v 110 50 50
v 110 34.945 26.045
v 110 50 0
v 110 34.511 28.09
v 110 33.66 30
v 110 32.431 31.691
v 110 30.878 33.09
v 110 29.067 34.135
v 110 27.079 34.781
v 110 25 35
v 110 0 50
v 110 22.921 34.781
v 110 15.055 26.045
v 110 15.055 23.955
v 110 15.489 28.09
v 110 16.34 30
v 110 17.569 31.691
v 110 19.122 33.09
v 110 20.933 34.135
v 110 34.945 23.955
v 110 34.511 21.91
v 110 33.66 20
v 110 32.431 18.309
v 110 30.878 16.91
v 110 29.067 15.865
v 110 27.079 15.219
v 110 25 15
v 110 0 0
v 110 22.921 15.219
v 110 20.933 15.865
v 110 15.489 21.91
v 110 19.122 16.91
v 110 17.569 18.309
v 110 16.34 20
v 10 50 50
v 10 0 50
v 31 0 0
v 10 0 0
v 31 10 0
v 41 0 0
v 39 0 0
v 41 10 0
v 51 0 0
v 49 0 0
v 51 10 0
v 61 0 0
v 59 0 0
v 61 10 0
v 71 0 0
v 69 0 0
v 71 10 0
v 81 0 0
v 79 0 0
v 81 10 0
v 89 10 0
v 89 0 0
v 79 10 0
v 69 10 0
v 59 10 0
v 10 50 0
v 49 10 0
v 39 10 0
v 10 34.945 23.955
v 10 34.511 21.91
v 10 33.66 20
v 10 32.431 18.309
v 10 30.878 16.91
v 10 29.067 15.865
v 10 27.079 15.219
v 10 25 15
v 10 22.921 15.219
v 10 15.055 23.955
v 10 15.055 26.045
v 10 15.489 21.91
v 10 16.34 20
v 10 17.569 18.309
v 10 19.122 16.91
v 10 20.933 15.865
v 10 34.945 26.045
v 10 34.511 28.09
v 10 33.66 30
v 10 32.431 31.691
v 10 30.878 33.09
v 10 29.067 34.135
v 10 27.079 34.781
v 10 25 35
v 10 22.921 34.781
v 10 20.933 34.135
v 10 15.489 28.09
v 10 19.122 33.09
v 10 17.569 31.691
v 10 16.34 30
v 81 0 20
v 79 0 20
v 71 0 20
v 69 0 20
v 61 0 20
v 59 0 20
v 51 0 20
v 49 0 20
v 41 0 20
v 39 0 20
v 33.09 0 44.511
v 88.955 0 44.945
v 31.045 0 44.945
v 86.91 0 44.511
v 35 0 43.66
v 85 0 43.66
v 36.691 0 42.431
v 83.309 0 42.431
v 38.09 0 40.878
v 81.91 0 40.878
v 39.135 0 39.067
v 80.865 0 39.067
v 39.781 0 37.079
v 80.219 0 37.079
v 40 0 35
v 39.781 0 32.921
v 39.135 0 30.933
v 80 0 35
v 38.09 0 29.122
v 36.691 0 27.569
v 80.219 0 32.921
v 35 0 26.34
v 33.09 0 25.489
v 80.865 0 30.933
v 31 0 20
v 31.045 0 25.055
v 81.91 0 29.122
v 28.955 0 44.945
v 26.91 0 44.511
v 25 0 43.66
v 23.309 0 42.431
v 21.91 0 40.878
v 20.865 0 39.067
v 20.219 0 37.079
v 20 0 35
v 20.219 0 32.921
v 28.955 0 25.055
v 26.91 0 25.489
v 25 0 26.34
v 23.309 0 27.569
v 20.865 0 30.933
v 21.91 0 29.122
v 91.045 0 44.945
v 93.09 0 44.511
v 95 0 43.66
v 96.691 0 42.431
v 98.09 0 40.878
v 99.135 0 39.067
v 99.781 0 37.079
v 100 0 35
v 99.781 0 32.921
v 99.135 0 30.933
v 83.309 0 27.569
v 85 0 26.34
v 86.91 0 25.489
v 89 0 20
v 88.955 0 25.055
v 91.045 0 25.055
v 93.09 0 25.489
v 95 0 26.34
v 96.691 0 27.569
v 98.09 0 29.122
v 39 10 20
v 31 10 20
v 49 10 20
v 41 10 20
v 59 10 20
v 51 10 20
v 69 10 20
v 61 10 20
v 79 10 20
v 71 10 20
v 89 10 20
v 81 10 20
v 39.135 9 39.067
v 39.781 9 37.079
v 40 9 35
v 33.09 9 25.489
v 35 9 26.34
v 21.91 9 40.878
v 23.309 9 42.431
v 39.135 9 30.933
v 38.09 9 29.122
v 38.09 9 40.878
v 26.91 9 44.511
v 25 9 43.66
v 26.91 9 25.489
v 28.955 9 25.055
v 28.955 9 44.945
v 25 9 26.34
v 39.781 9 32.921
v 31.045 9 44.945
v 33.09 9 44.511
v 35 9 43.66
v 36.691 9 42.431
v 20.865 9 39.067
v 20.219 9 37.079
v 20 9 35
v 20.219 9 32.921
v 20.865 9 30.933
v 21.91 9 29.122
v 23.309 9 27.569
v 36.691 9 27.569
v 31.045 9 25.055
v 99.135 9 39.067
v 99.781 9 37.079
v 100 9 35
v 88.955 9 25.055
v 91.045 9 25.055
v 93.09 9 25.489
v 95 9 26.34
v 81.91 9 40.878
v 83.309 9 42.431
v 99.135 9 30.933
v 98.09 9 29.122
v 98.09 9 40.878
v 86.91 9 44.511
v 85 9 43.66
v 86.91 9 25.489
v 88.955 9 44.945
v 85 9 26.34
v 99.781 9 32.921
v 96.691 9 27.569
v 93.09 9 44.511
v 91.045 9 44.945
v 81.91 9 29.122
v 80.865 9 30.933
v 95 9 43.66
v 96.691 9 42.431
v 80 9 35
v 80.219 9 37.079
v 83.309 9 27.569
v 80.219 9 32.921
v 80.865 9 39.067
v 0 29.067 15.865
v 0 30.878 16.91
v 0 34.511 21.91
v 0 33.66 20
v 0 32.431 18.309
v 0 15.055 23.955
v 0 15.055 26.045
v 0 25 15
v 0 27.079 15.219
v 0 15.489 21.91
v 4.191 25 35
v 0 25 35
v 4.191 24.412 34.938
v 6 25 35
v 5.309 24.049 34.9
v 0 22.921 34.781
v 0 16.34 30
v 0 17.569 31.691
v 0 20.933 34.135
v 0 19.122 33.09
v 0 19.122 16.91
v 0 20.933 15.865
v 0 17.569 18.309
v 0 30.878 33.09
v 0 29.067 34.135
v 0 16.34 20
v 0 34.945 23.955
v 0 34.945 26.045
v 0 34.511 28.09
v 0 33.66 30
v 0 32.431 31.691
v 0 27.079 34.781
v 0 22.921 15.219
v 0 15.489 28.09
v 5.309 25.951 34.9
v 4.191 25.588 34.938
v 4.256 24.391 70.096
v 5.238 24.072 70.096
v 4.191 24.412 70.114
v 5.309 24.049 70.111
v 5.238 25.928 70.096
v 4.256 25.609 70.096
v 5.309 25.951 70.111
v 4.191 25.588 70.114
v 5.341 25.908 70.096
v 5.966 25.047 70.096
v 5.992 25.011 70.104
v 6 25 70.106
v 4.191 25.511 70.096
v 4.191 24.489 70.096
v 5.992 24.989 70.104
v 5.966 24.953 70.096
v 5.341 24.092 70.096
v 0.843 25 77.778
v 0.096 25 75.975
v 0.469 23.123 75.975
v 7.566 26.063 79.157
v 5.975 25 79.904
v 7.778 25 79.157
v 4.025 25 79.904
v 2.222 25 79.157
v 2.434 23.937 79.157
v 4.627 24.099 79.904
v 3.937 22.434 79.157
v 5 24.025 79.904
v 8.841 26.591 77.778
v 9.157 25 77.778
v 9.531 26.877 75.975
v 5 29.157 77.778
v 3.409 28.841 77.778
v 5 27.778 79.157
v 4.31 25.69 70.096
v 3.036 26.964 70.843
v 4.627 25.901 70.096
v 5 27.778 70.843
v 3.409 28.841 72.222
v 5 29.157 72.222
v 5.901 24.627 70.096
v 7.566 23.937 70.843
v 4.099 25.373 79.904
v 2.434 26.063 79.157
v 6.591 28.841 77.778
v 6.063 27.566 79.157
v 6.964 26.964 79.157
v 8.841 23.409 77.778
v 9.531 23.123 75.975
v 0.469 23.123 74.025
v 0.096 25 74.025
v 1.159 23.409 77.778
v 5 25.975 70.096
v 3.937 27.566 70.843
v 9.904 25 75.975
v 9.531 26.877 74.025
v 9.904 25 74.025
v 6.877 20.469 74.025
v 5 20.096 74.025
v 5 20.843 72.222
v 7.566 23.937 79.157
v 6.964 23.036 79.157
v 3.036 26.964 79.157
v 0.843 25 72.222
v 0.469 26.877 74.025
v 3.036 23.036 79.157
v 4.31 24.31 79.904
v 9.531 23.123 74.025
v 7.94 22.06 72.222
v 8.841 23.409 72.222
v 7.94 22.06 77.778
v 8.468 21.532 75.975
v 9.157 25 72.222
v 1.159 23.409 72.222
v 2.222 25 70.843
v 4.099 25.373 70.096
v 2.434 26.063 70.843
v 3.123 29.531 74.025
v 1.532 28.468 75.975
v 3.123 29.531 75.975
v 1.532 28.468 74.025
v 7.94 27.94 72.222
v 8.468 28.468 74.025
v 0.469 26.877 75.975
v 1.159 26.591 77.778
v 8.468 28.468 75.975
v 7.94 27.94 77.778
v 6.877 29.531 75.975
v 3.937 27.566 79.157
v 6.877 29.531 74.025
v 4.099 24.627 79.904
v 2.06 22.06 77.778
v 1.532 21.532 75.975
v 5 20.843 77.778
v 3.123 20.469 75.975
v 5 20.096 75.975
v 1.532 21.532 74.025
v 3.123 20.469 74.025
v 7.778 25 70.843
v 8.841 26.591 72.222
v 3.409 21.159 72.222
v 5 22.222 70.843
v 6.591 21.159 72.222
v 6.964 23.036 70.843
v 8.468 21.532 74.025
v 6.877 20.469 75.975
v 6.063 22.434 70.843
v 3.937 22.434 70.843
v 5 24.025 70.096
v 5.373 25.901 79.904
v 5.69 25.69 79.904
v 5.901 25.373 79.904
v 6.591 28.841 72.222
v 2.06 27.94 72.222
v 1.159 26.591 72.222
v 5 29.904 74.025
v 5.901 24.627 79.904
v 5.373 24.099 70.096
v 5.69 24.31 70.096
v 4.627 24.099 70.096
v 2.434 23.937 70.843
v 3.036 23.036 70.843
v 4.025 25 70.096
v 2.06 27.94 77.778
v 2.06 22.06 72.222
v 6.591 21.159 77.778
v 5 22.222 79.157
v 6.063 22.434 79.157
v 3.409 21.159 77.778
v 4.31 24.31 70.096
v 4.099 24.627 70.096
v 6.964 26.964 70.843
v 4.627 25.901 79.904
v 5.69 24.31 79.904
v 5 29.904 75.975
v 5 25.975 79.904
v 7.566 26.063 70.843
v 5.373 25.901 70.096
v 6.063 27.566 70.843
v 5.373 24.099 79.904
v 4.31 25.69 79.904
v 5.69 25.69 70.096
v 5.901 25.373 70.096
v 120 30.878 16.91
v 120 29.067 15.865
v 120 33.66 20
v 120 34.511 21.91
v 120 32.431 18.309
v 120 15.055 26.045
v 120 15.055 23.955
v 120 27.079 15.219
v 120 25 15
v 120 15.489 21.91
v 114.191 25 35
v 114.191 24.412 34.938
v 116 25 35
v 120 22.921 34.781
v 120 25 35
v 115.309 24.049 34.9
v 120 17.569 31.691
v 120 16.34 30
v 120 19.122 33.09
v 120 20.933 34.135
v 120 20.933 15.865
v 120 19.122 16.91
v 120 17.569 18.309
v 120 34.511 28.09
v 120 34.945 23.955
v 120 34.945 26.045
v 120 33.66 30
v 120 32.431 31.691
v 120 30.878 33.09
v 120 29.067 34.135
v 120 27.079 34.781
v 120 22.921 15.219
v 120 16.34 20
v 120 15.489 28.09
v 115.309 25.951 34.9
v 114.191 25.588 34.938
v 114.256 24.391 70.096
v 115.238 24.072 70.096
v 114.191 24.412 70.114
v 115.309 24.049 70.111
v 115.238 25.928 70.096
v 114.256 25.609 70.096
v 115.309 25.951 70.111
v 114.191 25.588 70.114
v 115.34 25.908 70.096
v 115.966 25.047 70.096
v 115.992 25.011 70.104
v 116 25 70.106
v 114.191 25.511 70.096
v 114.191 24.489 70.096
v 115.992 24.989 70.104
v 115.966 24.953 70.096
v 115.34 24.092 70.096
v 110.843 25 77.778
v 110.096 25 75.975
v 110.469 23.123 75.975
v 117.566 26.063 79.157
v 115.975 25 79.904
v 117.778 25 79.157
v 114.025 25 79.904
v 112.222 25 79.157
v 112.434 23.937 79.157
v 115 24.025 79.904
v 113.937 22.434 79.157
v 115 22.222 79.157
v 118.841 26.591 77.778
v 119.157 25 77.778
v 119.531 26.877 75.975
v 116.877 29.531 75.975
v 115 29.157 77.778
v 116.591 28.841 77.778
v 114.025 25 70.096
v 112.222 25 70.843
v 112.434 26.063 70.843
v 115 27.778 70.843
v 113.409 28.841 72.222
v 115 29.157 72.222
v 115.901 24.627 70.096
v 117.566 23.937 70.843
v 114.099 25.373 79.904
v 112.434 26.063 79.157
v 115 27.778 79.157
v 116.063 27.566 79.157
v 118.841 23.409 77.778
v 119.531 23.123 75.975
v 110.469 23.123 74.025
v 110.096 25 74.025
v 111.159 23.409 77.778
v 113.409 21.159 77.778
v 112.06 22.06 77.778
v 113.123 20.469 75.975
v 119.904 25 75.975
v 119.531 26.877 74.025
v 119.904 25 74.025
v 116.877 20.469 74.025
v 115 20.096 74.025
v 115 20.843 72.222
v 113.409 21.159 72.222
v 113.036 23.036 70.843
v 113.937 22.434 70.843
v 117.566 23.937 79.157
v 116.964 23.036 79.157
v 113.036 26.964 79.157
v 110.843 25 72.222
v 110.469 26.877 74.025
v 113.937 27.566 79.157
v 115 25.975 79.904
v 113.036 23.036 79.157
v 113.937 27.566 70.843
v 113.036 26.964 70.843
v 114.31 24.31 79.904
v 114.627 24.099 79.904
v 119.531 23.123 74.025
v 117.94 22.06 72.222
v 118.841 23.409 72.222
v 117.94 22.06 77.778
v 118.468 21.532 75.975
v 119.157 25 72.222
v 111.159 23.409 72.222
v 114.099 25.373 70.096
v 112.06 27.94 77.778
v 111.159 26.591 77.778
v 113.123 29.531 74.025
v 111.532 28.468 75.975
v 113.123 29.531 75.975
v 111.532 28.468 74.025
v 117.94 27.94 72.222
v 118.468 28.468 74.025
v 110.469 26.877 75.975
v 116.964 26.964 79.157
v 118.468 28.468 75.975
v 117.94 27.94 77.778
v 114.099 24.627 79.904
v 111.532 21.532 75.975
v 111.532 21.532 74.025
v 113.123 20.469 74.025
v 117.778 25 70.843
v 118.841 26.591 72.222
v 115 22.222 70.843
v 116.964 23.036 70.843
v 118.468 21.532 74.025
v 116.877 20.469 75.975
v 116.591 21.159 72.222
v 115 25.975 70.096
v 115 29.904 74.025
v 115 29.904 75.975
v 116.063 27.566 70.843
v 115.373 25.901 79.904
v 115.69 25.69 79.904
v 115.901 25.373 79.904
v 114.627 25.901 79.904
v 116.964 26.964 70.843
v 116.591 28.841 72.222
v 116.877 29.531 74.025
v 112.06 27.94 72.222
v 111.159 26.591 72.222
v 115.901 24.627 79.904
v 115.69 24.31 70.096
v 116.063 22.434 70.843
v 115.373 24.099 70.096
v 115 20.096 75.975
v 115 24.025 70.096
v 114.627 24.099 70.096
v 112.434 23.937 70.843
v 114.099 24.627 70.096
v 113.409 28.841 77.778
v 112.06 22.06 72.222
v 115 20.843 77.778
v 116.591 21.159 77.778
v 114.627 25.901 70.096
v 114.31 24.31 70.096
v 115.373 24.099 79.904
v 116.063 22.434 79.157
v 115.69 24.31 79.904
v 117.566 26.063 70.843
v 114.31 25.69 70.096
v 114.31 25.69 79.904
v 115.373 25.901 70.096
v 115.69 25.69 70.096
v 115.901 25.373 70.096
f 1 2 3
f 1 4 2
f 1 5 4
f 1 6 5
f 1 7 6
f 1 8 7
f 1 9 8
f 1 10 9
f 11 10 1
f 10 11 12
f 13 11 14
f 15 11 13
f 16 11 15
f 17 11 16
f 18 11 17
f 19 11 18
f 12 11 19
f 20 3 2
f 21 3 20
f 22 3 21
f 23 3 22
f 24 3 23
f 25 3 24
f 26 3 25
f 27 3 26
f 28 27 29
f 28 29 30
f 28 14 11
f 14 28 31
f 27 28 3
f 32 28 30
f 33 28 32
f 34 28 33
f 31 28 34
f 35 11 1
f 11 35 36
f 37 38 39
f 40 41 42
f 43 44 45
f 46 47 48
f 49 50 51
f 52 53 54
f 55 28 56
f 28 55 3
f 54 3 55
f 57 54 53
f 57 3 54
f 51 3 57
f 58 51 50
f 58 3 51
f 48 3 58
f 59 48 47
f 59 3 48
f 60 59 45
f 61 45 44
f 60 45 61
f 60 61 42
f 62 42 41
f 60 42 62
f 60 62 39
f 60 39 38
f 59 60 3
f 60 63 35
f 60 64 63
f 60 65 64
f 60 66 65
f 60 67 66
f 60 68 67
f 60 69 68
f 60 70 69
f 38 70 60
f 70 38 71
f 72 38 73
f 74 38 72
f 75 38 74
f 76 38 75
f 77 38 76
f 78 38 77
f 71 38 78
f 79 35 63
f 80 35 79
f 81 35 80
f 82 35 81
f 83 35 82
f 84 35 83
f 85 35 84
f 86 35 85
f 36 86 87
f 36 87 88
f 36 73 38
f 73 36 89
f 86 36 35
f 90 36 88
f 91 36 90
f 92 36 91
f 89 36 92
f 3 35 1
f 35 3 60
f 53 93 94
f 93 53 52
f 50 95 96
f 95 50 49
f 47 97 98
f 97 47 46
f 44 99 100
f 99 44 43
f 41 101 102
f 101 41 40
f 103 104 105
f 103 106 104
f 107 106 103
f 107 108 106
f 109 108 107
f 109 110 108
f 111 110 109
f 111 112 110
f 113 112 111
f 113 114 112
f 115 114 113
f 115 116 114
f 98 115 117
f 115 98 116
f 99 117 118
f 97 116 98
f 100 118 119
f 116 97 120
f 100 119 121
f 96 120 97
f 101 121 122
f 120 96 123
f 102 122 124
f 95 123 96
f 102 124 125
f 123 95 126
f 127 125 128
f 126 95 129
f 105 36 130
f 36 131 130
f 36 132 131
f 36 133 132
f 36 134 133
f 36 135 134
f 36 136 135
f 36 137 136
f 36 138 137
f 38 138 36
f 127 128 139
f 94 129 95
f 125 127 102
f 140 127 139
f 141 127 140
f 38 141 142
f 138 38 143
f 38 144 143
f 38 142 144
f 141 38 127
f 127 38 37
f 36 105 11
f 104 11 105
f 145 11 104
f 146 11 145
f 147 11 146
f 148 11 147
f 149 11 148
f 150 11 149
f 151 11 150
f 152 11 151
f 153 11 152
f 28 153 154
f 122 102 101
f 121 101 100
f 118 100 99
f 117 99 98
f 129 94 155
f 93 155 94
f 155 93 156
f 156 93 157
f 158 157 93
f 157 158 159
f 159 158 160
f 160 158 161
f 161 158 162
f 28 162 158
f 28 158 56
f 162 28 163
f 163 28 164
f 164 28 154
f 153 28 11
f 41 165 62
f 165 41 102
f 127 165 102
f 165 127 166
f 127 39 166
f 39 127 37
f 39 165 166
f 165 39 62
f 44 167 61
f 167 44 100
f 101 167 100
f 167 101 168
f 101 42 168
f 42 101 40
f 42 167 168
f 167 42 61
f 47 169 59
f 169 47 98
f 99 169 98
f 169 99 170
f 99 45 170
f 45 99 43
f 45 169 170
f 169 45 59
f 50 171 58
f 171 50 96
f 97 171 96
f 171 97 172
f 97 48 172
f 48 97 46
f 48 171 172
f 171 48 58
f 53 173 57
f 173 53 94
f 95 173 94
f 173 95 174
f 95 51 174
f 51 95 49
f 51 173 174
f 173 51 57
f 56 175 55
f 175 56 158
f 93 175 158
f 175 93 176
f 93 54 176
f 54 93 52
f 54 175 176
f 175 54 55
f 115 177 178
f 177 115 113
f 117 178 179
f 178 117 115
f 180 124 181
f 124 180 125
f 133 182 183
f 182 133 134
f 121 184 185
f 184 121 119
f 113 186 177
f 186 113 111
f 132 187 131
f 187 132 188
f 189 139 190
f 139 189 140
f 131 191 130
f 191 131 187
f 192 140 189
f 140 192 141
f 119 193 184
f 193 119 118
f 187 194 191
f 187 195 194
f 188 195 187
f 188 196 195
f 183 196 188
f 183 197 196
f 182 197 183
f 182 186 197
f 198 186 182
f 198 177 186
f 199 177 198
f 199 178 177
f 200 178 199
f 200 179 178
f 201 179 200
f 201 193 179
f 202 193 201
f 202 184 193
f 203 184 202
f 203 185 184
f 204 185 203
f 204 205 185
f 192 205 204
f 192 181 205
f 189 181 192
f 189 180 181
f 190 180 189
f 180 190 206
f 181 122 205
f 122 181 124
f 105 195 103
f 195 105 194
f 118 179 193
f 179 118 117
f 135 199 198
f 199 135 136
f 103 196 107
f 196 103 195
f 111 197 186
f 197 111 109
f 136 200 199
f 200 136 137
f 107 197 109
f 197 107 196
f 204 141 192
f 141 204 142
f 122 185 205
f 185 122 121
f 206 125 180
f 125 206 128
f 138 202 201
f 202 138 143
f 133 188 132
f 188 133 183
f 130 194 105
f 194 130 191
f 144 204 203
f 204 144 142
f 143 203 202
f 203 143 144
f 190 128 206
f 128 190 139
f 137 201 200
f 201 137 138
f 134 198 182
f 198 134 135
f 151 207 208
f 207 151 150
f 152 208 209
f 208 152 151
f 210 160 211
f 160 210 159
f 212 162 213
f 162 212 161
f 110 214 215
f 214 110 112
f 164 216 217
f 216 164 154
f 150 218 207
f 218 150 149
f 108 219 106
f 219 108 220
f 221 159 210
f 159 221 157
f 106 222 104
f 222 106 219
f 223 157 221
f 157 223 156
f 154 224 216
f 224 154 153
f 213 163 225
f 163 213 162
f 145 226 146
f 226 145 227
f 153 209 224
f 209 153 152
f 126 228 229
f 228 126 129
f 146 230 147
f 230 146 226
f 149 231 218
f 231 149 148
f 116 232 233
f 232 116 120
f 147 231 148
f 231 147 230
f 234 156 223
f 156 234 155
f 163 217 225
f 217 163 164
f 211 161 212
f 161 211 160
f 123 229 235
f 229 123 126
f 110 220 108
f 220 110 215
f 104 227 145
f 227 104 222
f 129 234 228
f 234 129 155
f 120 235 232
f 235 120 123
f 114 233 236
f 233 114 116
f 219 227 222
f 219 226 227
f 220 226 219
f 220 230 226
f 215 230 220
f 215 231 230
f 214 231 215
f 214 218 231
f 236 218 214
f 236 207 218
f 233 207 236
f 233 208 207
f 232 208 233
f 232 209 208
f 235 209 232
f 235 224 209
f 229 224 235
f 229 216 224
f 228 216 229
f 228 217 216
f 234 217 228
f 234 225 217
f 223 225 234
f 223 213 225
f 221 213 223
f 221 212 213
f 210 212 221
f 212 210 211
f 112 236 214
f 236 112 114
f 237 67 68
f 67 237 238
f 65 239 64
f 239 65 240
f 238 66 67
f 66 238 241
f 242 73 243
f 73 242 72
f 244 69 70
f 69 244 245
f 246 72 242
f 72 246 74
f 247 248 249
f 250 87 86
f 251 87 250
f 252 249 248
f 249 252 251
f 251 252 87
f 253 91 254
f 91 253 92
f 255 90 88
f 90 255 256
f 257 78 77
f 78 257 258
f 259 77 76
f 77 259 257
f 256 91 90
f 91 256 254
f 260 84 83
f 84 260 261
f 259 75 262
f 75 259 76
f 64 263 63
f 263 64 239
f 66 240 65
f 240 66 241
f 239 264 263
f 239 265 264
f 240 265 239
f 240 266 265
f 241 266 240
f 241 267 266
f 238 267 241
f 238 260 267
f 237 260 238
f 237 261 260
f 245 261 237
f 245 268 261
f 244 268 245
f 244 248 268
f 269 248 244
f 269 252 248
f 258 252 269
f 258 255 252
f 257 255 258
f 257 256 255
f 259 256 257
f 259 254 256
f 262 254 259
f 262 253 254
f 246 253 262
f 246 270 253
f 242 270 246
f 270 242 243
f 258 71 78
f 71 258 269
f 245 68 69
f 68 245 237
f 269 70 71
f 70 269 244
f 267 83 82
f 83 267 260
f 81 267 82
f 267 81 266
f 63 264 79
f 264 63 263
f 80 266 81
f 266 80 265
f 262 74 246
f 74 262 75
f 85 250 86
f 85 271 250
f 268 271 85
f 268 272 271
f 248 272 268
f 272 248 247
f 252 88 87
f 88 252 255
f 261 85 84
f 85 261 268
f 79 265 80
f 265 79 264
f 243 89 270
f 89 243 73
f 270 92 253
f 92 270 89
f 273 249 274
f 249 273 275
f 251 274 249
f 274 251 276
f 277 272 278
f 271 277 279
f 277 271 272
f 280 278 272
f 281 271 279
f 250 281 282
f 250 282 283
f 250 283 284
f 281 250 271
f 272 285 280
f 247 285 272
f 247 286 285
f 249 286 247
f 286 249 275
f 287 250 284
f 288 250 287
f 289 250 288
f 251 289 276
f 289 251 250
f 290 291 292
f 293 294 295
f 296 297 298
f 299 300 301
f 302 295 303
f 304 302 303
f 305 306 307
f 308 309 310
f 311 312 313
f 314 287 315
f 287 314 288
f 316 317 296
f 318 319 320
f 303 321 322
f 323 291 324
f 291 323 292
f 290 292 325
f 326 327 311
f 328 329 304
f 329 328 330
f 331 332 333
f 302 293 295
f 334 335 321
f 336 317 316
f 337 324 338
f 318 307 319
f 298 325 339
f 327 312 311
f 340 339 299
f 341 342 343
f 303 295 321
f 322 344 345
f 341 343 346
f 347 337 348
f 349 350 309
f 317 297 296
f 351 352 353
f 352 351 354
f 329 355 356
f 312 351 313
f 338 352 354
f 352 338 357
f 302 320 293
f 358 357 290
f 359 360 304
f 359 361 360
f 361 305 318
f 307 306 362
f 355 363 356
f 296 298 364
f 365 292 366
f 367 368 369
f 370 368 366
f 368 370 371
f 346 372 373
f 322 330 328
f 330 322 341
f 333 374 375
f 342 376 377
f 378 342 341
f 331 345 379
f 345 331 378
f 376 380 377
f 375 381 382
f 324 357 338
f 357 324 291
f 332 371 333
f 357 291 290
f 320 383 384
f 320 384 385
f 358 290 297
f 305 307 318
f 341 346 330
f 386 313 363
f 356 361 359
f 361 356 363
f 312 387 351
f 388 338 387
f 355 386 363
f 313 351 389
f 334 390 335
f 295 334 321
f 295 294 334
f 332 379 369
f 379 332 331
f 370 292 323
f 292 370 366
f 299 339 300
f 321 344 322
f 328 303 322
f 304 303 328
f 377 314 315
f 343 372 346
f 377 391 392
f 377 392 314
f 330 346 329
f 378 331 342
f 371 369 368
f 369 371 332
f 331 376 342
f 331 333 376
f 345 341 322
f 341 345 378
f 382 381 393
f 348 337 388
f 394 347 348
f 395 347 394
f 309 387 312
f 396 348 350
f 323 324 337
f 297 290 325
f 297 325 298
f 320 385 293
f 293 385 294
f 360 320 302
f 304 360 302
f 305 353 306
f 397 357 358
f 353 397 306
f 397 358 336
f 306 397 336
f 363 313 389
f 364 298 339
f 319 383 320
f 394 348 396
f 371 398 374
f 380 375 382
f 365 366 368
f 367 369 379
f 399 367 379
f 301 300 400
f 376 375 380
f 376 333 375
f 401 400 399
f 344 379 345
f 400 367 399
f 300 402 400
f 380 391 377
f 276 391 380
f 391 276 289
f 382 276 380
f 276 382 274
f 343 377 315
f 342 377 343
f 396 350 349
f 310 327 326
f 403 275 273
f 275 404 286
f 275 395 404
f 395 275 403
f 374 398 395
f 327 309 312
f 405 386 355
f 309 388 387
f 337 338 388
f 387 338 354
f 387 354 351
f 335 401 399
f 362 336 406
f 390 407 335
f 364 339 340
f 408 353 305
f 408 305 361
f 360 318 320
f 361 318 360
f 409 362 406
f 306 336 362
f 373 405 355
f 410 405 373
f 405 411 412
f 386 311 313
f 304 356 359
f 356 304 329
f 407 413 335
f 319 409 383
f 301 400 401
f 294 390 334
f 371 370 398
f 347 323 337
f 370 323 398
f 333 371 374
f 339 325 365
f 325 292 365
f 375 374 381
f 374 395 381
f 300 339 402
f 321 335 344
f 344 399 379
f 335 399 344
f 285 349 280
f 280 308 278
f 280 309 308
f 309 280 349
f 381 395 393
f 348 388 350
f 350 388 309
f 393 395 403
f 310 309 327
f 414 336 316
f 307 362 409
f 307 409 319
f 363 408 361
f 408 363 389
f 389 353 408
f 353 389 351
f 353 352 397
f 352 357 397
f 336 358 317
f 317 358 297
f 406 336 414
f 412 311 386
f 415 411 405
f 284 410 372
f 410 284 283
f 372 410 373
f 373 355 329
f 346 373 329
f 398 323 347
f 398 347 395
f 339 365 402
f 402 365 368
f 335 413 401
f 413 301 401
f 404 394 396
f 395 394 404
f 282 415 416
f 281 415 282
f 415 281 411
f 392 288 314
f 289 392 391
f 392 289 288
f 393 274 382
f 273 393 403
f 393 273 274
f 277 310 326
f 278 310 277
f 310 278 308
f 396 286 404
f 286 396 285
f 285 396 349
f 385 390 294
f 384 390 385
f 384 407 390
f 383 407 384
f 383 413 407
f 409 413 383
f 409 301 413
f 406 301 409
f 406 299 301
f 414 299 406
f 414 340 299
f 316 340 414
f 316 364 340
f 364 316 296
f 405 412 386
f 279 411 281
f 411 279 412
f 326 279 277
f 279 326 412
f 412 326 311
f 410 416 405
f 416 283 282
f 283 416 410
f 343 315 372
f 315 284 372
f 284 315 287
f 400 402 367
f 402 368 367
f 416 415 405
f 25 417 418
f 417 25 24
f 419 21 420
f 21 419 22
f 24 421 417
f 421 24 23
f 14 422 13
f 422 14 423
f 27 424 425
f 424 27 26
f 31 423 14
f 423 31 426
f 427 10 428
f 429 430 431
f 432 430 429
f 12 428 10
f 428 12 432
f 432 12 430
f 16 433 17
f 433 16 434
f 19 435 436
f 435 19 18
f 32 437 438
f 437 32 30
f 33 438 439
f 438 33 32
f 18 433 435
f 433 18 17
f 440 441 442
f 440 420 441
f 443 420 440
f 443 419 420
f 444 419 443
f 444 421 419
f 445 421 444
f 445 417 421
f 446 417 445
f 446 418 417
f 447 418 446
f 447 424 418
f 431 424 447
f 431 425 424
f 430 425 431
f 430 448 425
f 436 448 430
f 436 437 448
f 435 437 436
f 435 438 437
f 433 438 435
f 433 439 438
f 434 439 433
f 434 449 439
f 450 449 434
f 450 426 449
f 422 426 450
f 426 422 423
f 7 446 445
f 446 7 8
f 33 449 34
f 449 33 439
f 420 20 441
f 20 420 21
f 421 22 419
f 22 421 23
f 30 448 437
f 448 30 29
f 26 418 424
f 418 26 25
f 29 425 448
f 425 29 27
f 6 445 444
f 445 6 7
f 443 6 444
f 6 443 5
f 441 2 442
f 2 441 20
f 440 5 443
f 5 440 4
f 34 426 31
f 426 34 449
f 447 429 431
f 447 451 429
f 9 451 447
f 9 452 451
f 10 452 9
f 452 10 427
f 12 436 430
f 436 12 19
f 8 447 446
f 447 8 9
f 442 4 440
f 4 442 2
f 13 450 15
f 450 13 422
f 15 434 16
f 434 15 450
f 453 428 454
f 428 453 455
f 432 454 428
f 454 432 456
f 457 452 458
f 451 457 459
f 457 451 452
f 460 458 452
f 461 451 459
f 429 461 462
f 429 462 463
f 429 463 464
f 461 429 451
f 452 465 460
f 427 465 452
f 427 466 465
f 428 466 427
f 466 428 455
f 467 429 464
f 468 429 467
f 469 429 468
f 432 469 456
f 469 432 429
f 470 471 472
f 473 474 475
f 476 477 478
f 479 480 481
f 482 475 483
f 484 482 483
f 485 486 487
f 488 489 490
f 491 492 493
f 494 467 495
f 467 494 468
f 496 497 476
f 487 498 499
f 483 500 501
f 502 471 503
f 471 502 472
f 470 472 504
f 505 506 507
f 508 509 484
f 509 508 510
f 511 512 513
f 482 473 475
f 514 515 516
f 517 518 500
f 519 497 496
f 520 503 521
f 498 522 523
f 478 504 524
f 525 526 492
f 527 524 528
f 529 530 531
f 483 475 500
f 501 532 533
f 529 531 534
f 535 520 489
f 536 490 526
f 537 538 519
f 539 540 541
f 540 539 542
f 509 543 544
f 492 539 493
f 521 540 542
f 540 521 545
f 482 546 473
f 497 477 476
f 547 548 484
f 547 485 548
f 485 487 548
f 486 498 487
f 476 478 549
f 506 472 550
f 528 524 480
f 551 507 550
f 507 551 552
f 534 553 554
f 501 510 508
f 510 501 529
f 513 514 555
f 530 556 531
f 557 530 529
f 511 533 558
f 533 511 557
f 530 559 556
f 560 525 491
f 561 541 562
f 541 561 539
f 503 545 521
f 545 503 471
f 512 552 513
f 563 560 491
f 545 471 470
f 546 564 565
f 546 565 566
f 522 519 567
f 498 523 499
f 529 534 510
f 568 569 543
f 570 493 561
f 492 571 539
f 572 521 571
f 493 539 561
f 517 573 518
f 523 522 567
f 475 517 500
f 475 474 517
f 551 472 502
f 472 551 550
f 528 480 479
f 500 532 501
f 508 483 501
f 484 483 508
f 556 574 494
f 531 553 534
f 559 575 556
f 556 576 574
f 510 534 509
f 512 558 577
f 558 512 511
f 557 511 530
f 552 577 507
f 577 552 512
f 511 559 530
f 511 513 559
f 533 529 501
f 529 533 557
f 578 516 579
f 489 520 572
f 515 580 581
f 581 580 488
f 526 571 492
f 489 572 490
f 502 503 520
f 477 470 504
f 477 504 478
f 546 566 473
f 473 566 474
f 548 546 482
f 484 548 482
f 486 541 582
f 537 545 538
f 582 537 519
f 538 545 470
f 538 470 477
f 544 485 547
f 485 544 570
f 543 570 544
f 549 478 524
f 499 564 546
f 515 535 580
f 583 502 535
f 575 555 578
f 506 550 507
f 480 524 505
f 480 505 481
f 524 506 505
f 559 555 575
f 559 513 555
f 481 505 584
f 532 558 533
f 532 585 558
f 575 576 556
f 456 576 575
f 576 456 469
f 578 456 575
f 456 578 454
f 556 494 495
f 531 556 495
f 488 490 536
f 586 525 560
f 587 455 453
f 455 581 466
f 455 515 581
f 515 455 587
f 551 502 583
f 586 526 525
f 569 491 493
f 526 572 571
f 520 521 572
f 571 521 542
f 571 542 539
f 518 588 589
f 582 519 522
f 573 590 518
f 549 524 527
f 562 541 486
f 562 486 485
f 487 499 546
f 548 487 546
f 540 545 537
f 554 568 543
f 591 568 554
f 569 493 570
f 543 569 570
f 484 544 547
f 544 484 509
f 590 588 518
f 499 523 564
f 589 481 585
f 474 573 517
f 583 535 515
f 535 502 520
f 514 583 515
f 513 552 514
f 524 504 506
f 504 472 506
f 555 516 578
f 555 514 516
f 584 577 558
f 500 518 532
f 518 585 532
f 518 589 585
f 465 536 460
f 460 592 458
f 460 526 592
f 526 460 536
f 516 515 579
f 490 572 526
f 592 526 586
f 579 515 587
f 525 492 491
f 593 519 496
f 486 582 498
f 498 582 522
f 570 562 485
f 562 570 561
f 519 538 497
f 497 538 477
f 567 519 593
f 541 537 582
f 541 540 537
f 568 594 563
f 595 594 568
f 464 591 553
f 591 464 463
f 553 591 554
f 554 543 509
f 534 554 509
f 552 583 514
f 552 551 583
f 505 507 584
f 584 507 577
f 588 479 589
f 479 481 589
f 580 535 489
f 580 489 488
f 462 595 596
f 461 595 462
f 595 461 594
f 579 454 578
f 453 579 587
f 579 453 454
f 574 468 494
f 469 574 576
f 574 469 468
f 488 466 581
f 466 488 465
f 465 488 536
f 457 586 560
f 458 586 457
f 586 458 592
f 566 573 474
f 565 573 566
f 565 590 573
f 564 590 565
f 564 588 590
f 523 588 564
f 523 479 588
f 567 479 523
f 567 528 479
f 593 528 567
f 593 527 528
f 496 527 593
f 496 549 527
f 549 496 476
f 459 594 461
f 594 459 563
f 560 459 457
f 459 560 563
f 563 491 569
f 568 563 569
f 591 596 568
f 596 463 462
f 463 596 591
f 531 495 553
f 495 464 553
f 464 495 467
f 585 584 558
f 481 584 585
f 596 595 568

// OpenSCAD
////////////////////////////////////////
//
//     By: Jeff Crossman
//	  For: Golan Levin's IACD 2014
//		   Carnegie Mellon University
//	Title: Parametric Robot Head
//
/////////////////////////////////////// 


////////////////////////////////////////
//									//
//		PARAMETRIC PARAMETERS		//
//									//
////////////////////////////////////////

AntennaHeight = 50;		// Default: 50
AntennaBallRadius = 5;	// Default: 5
EyeDiameter = 10;		// Default: 10
EyeSpacingOffset = 0;	// Default: 0
MouthHeight = 20;		// Default: 20


//////////////   END   /////////////////



// Head
translate([10, 0, 0]){
difference() {
	// Base head
	cube([100, 50, 50]);

	// Mouth
	translate([21, 0, 0]){
		cube([8, 10, MouthHeight]);
	}
	translate([31, 0, 0]){
		cube([8, 10, MouthHeight]);
	}
	translate([41, 0, 0]){
		cube([8, 10, MouthHeight]);
	}
	translate([51, 0, 0]){
		cube([8, 10, MouthHeight]);
	}
	translate([61, 0, 0]){
		cube([8, 10, MouthHeight]);
	}
	translate([71, 0, 0]){
		cube([8, 10, MouthHeight]);
	}

	// Left Eye
	translate([20+EyeSpacingOffset, 4, 35]){
		rotate(a=[90, 0, 0]) {
			cylinder(10, EyeDiameter, EyeDiameter, center=true);
		}
	}

	// Right Eye
	translate([80-EyeSpacingOffset, 4, 35]){
		rotate(a=[90, 0, 0]) {
			cylinder(10, EyeDiameter, EyeDiameter, center=true);
		}
	}
}
}

// Left Ear
translate([5, 25, 25]){
	rotate(a=[0, 90, 0]) {
		cylinder(10, 10, 10, center=true);
	}
}
translate([5, 25, (25+(AntennaHeight/2))]){
	cylinder(AntennaHeight, 1, 1, center=true);
}
translate([5, 25, 25+AntennaHeight]){
	sphere(AntennaBallRadius);
}

// Right Ear
translate([115, 25, 25]){
	rotate(a=[0, 90, 0]) {
		cylinder(10, 10, 10, center=true);
	}
}
translate([115, 25, (25+(AntennaHeight/2))]){
	cylinder(AntennaHeight, 1, 1, center=true);
}
translate([115, 25, 25+AntennaHeight]){
	sphere(AntennaBallRadius);
}
